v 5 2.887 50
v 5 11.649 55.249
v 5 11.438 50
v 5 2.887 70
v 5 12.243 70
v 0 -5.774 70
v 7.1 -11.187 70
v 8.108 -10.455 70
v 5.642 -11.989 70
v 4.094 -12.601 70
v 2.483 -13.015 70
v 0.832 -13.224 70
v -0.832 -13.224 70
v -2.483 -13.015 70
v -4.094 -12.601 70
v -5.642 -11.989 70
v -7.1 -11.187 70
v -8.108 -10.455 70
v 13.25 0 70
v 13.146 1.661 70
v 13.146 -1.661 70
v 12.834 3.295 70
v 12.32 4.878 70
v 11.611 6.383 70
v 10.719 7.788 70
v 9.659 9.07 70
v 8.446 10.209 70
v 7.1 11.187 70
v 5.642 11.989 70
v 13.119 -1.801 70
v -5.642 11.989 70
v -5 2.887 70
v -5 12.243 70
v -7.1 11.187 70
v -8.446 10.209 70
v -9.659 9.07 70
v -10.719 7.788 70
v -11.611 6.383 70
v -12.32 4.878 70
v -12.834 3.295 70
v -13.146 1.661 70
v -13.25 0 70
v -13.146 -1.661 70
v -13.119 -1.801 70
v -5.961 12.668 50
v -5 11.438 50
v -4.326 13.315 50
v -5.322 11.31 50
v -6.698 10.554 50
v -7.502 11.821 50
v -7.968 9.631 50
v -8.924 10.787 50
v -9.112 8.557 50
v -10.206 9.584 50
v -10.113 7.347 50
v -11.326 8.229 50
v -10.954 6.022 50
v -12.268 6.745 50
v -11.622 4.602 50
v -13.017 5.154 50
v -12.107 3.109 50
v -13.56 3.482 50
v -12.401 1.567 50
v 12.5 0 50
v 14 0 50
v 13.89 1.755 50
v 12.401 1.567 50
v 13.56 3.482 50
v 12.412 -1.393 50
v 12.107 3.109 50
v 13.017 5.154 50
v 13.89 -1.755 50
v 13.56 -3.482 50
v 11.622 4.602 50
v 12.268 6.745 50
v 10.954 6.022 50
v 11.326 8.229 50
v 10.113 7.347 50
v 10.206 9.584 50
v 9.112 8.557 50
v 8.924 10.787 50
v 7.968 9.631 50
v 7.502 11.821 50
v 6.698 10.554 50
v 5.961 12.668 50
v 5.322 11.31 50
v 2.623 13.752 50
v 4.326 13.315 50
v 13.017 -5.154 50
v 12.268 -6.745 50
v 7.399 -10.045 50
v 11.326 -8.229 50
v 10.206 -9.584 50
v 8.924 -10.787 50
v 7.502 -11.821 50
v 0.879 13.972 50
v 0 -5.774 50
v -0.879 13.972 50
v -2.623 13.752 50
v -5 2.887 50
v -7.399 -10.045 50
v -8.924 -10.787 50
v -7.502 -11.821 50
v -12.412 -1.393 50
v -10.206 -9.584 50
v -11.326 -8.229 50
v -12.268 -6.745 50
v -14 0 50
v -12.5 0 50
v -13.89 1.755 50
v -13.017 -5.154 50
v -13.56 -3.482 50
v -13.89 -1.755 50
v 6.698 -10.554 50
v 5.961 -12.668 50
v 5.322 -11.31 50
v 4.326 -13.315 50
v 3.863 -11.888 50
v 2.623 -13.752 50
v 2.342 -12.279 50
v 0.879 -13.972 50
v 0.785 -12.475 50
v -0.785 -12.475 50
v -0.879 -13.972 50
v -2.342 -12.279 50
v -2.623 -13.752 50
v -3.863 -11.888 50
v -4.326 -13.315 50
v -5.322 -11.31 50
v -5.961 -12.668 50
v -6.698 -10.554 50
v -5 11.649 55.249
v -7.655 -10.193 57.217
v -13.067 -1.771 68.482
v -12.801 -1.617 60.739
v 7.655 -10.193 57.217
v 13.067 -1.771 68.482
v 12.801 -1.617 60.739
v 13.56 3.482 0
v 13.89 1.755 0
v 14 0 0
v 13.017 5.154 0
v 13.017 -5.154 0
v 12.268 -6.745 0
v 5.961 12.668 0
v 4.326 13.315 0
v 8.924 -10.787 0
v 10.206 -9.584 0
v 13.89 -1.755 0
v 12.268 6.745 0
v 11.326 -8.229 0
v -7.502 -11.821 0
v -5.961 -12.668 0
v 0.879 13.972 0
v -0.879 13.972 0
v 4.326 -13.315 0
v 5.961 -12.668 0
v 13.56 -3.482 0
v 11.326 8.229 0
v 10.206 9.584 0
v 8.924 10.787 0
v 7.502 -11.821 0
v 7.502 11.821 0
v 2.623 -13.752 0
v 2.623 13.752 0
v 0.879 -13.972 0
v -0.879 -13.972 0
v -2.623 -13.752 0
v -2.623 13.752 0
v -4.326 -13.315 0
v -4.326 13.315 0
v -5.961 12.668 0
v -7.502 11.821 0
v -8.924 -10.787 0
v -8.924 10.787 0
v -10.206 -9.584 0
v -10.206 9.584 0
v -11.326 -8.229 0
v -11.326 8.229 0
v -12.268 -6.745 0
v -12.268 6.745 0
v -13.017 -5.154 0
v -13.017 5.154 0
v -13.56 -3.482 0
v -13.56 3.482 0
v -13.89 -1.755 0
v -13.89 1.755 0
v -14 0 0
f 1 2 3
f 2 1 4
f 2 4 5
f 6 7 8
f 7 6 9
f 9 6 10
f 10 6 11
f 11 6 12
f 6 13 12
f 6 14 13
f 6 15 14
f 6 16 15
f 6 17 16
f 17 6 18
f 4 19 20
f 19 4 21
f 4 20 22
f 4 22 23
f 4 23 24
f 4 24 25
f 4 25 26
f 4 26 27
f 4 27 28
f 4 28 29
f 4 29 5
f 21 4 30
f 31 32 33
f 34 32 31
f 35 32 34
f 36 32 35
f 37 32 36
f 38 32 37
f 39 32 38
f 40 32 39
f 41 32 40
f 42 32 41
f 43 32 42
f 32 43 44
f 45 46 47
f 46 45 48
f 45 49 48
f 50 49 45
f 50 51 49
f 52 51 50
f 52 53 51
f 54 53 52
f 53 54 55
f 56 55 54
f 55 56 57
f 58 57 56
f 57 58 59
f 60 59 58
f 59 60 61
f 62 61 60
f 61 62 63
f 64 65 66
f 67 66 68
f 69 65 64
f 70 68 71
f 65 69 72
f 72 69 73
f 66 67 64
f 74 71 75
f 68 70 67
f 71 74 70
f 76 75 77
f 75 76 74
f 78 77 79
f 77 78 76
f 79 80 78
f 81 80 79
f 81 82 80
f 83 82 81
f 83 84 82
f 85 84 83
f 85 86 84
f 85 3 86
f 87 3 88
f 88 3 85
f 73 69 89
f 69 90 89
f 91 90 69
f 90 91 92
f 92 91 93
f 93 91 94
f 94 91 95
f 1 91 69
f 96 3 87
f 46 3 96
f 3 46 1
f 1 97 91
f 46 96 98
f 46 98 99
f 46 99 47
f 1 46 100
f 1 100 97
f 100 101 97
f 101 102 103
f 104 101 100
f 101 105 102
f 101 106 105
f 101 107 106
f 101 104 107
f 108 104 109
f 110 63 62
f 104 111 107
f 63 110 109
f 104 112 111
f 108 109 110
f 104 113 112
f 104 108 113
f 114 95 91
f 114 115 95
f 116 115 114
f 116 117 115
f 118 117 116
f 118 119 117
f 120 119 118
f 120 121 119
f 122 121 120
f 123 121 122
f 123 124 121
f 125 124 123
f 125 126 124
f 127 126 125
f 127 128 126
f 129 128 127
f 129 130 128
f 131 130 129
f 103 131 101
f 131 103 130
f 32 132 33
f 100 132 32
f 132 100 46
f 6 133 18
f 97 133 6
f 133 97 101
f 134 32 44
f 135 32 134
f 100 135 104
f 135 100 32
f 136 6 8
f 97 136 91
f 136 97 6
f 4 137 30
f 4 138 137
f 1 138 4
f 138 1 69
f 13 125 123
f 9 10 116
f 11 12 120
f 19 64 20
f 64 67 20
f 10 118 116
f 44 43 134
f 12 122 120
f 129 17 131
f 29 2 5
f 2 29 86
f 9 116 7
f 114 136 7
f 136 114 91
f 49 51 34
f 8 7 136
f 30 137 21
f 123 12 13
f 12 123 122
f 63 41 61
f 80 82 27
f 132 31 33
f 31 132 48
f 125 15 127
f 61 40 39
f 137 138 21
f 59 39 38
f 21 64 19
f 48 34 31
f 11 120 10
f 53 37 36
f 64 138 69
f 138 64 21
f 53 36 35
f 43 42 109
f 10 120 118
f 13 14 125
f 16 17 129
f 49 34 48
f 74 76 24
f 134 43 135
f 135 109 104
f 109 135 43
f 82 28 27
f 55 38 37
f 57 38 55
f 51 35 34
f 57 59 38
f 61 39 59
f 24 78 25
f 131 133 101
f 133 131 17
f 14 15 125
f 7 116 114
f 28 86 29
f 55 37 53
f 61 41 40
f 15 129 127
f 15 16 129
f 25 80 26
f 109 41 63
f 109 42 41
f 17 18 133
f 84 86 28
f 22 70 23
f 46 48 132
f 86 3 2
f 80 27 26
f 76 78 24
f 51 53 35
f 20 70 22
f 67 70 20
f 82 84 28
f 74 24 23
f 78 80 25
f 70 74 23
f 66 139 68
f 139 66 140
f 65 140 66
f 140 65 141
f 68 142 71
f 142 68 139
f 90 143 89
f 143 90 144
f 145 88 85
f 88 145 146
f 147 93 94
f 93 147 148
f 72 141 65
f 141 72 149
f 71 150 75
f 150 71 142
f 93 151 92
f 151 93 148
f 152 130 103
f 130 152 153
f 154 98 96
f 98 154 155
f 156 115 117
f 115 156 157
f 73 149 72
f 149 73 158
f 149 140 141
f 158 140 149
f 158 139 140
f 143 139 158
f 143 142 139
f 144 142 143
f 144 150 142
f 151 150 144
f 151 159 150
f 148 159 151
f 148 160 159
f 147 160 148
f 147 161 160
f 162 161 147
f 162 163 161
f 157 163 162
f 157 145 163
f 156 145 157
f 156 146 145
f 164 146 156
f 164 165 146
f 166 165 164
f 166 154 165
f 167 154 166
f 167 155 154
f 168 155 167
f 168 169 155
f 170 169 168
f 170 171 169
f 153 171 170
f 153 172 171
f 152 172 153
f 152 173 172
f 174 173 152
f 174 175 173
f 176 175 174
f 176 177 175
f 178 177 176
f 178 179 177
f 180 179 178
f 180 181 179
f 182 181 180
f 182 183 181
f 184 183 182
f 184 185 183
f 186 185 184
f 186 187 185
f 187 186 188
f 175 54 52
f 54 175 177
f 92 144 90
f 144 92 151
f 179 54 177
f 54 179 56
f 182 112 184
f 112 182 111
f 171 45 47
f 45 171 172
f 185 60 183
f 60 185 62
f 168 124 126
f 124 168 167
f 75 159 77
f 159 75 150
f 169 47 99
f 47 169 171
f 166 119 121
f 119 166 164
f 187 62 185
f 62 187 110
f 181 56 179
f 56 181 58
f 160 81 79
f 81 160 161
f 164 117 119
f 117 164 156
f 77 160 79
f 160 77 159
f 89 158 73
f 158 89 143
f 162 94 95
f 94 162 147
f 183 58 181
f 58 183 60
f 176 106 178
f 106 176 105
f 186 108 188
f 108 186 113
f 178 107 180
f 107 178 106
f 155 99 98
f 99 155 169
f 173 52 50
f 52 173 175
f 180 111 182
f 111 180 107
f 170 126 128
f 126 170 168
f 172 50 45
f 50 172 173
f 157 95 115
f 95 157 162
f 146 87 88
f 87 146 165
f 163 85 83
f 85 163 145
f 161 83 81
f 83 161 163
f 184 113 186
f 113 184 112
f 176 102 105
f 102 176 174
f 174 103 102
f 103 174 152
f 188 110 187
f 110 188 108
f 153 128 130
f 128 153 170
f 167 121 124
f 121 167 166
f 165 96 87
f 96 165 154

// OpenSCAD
INNER_DIA = 25;
OUTER_DIA = 28;
INNER_LENGTH = 20;
OUTER_LENGTH = 50;
SLOT_WIDTH = 10;
N_SLOTS = 3;

$fn = 50;

union() {
    translate([0, 0, OUTER_LENGTH])
    difference() {
        cylinder(d1 = INNER_DIA, d2 = (OUTER_DIA+INNER_DIA)/2, h = INNER_LENGTH);
        for(i = [0:N_SLOTS]) {
            rotate([0, 0, i*360/N_SLOTS])
            translate([-SLOT_WIDTH/2, 0, 0])
            cube(size = [SLOT_WIDTH, OUTER_DIA, INNER_LENGTH]);
        }
    }
    
    cylinder(d = OUTER_DIA, h = OUTER_LENGTH);
}
